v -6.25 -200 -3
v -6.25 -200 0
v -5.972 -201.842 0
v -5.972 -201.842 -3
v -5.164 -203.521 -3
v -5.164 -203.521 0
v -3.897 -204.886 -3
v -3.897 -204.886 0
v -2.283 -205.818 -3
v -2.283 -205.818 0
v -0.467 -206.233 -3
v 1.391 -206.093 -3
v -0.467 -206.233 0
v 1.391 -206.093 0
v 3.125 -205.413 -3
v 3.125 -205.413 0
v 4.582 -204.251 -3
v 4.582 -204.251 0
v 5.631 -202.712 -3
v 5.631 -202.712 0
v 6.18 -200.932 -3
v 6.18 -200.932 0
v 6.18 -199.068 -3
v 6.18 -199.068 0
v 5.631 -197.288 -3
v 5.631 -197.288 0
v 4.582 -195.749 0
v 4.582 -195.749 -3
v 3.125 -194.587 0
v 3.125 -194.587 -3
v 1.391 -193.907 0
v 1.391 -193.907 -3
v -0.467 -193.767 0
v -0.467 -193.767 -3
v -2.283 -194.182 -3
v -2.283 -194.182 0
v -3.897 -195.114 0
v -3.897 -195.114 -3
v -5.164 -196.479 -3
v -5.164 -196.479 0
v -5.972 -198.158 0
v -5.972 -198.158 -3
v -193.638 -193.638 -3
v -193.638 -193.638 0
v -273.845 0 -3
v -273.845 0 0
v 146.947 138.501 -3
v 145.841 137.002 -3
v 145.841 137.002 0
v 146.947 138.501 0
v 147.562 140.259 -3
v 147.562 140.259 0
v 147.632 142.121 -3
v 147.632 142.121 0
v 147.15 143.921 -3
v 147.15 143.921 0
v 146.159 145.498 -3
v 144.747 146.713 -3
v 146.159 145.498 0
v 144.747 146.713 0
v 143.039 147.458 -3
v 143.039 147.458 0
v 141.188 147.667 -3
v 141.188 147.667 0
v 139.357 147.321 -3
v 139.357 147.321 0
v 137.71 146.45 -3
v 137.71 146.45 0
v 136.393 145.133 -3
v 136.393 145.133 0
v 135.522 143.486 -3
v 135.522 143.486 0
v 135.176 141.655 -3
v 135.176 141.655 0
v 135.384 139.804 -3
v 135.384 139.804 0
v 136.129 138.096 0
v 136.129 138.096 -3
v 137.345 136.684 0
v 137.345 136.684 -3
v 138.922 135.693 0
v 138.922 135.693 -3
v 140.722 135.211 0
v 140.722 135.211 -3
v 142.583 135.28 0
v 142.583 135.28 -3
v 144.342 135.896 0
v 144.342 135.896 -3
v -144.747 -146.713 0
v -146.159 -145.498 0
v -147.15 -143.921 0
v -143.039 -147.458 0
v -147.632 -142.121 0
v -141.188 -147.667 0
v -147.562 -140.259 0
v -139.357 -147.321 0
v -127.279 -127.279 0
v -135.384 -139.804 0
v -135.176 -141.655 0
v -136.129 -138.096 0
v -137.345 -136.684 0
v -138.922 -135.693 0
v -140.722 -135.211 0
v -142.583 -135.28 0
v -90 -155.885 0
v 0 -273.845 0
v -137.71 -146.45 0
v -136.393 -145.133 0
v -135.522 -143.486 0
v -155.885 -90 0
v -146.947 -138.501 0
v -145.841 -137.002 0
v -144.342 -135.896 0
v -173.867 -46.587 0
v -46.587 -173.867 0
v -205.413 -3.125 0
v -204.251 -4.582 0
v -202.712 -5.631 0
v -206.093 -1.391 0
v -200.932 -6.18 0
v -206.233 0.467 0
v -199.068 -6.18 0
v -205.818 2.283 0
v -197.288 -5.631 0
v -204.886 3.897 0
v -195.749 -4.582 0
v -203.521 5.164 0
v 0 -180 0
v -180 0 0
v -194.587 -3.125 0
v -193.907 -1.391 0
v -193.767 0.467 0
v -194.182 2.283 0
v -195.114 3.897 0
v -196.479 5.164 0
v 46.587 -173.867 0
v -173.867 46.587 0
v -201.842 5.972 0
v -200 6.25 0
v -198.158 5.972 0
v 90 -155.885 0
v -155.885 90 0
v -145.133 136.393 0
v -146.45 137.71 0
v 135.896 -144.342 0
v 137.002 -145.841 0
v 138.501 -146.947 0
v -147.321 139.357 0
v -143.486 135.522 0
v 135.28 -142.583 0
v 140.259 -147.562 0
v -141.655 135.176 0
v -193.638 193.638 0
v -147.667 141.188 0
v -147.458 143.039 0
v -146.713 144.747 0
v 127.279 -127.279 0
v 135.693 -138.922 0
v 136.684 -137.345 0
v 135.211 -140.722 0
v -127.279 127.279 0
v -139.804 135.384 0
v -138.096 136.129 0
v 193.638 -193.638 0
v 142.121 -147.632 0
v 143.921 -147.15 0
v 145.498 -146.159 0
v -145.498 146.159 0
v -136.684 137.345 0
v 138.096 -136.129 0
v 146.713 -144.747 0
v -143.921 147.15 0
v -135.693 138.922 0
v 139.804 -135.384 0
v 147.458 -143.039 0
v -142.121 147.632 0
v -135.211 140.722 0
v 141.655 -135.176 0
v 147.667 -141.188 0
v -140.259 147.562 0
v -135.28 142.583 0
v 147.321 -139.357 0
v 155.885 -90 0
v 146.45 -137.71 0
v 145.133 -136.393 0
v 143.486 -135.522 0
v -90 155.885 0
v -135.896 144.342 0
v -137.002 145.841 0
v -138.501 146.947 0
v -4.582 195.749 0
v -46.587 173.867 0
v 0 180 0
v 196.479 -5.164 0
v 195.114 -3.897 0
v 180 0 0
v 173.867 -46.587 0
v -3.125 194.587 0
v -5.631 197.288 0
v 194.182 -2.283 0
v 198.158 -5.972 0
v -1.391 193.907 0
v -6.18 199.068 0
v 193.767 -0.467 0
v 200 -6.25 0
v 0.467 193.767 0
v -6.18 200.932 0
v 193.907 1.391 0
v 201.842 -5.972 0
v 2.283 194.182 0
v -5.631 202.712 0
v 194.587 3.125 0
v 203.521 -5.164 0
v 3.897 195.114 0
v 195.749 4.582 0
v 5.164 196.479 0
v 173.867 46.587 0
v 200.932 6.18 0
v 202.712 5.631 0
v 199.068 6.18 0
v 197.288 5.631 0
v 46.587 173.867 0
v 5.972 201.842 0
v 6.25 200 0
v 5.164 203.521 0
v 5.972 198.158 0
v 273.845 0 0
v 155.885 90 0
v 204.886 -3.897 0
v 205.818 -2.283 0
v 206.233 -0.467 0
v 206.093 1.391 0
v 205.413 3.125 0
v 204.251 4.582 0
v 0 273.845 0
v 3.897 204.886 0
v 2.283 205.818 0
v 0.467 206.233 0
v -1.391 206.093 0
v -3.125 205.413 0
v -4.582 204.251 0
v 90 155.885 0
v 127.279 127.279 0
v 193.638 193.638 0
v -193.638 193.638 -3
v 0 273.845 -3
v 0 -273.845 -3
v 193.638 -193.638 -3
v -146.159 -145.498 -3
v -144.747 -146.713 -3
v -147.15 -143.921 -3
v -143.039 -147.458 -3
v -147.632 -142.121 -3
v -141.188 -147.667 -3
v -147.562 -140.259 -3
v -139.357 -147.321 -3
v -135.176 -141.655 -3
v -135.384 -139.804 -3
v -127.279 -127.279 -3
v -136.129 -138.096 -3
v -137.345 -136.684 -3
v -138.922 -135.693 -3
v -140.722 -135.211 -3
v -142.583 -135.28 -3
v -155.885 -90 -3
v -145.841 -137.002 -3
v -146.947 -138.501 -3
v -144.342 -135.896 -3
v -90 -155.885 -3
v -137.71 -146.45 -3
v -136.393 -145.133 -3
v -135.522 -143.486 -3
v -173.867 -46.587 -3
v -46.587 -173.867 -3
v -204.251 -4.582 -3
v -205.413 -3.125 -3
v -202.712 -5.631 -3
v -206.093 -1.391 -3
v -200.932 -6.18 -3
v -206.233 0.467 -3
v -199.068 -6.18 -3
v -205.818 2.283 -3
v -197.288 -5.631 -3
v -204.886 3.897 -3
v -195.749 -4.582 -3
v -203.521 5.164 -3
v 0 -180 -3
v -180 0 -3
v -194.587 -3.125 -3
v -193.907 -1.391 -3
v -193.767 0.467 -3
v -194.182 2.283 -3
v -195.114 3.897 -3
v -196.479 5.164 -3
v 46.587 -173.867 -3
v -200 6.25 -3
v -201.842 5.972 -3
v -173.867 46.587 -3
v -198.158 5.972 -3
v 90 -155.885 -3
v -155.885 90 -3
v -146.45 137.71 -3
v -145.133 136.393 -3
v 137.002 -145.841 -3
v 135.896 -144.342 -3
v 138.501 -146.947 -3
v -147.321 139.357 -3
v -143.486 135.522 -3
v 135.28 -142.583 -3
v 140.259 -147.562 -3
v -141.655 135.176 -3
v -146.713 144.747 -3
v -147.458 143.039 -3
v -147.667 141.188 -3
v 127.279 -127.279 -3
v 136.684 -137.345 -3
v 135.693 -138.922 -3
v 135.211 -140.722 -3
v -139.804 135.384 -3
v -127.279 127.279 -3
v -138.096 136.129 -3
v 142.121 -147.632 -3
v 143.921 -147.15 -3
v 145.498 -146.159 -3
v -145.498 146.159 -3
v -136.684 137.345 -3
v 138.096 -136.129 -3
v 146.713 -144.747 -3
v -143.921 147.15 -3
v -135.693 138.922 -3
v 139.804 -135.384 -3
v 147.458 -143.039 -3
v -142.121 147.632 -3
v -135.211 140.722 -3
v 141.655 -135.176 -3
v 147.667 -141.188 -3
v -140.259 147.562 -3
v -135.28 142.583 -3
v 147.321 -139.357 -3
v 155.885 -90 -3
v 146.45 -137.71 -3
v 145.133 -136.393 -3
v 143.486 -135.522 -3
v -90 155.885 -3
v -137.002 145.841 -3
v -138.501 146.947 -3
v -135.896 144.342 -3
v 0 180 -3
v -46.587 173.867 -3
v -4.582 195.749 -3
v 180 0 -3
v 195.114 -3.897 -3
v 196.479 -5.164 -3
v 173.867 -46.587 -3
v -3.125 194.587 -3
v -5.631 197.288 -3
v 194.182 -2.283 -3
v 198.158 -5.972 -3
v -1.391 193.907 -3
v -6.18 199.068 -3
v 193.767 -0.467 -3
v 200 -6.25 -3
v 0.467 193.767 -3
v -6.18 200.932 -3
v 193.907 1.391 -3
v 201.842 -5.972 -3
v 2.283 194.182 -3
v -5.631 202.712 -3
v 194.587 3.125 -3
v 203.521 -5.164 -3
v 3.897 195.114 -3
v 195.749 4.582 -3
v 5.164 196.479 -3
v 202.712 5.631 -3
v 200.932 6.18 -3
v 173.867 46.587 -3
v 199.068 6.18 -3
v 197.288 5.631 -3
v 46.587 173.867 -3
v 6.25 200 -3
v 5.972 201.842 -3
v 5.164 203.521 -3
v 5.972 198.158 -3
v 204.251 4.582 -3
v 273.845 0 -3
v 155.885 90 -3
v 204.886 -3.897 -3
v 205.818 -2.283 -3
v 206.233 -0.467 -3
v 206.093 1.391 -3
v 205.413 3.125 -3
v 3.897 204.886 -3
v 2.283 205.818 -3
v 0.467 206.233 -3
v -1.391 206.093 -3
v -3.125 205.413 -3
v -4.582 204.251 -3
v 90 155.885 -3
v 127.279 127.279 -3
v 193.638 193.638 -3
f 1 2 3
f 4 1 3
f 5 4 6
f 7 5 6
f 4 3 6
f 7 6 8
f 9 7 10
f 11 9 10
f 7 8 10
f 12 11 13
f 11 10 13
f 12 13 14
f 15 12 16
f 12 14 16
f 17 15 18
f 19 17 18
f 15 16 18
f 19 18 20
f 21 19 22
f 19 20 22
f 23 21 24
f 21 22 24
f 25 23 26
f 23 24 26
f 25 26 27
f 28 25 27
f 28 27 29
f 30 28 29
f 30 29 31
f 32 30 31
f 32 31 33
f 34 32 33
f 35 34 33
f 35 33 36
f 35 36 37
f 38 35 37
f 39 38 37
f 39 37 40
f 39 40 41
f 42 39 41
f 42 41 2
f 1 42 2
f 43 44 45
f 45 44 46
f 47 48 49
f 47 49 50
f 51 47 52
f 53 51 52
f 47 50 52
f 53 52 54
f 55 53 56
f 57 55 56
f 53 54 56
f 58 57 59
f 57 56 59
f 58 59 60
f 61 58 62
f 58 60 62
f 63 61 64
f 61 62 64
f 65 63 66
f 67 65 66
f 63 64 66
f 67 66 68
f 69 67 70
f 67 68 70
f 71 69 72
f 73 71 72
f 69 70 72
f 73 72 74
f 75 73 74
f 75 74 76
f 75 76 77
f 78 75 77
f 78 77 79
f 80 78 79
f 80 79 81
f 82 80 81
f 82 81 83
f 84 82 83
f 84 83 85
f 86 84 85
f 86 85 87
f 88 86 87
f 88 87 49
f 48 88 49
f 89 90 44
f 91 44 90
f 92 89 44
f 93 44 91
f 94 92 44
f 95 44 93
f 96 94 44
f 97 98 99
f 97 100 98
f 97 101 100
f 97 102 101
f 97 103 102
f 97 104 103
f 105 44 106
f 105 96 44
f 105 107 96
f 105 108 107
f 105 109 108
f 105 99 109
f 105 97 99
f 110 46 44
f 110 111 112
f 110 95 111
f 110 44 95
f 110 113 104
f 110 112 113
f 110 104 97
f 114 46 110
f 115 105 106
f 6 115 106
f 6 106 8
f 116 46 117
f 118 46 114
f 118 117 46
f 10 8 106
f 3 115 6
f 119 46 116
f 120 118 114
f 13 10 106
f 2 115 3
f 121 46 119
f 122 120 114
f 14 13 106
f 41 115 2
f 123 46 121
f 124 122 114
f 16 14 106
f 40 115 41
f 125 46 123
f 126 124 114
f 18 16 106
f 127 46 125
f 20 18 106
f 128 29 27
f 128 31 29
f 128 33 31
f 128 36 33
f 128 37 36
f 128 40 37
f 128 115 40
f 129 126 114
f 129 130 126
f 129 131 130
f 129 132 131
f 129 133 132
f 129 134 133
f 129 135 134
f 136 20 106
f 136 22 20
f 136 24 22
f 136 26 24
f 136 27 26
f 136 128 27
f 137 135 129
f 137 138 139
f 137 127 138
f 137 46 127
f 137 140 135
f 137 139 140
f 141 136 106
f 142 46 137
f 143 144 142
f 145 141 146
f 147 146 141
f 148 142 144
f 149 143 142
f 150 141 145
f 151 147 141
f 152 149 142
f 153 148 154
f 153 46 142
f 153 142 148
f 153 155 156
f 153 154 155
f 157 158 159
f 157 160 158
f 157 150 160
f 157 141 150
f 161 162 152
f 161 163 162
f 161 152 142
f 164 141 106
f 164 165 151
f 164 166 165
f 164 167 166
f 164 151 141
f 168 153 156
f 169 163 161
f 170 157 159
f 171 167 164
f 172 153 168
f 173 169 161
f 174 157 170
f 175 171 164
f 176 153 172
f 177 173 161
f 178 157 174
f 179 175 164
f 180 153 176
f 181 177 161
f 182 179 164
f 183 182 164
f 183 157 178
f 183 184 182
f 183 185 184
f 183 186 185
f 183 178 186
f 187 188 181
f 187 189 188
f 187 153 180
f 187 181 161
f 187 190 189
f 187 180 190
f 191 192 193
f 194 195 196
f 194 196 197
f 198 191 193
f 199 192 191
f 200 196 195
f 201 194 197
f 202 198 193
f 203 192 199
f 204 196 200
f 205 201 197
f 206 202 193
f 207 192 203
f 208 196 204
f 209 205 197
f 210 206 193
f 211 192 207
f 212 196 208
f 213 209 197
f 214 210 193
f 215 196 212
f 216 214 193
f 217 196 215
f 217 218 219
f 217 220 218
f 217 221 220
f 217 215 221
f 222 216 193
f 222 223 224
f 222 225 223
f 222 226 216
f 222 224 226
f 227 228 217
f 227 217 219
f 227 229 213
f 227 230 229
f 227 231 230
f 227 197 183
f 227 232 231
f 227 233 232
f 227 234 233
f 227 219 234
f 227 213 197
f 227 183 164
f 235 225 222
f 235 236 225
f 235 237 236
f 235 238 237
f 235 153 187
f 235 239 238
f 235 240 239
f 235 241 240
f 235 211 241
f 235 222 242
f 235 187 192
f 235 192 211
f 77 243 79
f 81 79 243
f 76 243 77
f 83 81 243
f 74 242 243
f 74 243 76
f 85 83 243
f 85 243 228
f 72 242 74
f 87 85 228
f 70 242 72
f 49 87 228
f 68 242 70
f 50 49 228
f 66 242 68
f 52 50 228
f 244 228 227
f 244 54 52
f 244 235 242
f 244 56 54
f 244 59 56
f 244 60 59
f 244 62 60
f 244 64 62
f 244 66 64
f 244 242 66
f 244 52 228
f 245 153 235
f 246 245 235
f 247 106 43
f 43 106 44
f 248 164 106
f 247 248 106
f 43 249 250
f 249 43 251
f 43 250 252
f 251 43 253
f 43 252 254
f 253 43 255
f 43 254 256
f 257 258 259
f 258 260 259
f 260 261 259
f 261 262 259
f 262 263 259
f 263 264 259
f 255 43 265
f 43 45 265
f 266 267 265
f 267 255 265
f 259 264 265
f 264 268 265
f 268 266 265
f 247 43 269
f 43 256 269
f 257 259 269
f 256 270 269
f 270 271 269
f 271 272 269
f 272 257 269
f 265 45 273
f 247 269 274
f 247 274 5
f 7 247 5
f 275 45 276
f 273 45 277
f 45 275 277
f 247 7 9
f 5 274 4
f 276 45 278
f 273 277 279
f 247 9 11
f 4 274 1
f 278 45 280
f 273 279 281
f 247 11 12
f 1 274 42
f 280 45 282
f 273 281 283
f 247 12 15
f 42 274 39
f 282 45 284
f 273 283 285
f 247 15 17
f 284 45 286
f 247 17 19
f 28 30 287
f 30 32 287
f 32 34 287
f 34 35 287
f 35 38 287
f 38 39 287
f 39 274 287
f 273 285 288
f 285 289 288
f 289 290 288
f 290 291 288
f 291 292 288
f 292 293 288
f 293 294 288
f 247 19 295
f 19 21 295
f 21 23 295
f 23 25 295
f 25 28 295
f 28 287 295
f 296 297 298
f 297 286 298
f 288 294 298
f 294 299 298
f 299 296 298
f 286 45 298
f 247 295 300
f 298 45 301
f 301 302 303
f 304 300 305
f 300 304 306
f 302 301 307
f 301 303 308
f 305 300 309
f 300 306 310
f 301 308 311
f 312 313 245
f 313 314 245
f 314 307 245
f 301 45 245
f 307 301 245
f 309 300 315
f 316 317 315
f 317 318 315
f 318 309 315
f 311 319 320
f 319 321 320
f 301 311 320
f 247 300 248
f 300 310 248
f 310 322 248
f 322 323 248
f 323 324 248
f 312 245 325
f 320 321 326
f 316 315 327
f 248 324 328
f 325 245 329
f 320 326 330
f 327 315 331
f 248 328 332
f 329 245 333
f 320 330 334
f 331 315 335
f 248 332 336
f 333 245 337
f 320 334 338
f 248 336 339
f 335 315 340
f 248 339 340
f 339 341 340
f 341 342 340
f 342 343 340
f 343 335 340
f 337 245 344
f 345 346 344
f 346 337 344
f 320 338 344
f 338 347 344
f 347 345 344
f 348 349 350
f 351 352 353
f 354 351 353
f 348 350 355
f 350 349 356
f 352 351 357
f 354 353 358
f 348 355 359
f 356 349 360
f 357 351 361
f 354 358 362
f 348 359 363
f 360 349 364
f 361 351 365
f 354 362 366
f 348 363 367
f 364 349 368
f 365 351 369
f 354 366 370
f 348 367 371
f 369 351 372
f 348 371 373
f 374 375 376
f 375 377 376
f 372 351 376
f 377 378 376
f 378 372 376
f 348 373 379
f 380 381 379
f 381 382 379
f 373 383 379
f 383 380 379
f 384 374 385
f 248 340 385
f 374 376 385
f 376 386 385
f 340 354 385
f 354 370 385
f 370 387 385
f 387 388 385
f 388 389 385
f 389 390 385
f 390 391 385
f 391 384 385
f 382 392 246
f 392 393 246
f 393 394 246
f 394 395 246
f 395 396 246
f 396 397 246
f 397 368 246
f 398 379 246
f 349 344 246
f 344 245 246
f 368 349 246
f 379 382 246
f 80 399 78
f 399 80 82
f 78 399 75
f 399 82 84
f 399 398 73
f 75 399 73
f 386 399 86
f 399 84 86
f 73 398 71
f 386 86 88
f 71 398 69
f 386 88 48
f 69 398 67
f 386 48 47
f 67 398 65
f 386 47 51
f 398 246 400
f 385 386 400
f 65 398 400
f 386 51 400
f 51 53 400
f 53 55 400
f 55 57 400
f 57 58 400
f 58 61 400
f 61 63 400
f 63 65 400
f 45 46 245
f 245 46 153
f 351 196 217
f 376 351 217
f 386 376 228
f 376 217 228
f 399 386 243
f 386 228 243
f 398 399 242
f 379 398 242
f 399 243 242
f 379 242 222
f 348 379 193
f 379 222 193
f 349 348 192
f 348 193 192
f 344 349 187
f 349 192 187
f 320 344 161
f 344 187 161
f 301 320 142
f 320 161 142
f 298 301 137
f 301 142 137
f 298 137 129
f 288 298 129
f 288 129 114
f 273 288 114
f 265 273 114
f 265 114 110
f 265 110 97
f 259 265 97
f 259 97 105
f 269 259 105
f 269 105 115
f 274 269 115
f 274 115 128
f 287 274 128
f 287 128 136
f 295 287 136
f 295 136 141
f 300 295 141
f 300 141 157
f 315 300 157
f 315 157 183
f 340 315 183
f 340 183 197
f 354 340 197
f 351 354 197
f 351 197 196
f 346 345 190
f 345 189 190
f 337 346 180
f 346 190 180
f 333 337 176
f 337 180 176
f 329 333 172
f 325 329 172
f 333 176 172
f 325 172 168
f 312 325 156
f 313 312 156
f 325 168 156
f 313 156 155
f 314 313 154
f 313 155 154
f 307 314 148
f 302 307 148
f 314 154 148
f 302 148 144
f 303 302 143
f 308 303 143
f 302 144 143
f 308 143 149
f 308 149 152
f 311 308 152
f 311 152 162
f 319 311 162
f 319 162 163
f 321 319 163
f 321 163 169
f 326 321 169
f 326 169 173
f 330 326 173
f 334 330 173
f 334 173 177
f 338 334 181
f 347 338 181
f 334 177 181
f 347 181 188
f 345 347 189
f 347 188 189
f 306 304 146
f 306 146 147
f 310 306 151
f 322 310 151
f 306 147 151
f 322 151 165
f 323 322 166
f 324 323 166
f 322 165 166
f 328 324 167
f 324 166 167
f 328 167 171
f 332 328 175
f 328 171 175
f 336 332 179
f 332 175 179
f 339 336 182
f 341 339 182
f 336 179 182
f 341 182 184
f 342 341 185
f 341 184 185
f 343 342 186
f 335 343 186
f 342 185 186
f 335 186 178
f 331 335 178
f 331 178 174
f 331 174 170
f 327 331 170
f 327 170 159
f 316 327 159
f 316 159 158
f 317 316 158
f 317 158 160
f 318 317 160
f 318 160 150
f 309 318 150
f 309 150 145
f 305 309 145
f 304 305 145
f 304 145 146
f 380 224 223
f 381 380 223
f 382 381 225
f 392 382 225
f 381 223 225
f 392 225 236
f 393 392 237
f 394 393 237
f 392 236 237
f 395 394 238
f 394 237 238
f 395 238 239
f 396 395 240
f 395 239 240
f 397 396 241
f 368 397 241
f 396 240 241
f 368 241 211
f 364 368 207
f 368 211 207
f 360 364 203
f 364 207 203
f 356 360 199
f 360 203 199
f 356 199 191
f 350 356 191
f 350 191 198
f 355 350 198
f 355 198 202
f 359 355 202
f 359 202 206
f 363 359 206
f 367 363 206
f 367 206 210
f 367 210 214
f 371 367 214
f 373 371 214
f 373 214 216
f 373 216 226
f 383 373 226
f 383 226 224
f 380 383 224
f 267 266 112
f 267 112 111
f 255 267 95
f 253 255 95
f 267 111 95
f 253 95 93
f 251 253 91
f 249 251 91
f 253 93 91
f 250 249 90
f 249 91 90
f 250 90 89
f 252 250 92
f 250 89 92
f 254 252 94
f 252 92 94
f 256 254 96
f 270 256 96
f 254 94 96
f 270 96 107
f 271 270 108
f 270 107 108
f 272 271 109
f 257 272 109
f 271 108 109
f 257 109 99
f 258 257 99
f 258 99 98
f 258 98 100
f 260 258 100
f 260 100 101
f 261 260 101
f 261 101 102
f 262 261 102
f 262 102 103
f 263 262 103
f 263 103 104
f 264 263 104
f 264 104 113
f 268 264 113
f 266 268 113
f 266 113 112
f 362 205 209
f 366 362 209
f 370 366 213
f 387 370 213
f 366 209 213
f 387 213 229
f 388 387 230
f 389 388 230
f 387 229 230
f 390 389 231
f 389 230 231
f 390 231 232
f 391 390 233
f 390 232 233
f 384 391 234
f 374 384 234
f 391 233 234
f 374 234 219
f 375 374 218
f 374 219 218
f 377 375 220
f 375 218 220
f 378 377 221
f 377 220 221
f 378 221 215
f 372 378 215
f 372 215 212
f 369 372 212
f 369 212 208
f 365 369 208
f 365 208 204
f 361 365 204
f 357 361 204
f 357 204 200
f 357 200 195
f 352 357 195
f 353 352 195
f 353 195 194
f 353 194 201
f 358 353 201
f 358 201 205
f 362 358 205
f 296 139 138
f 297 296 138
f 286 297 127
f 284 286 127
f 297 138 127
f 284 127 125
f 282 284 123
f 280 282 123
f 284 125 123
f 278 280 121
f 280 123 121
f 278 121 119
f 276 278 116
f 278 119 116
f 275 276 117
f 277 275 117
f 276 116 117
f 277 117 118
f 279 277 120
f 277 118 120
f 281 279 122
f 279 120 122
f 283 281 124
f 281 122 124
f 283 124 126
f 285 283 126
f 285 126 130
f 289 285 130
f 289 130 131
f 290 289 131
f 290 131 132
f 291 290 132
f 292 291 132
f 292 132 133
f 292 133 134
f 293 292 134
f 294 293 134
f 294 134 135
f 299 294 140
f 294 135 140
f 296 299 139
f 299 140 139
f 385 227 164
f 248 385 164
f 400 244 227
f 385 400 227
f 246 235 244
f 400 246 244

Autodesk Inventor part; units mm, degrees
ref_plane "YZ Plane" through (0, 0, 0) normal (1, 0, 0) x (0, 1, 0)
ref_plane "XZ Plane" through (0, 0, 0) normal (0, 1, 0) x (-1, 0, 0)
ref_plane "XY Plane" through (0, 0, 0) normal (0, 0, 1) x (1, 0, 0)
sketch "Sketch2" plane through (0, 0, 0) normal (0, 0, 1) x (1, 0, 0)
  line L0 (-193.6378, 193.6378) -> (0, 273.8452)
  line L1 (0, 273.8452) -> (193.6378, 193.6378)
  line L2 (193.6378, 193.6378) -> (273.8452, 0)
  line L3 (273.8452, 0) -> (193.6378, -193.6378)
  line L4 (193.6378, -193.6378) -> (0, -273.8452)
  line L5 (0, -273.8452) -> (-193.6378, -193.6378)
  line L6 (-193.6378, -193.6378) -> (-273.8452, 0)
  line L7 (-273.8452, 0) -> (-193.6378, 193.6378)
  circle A0 centre (0, 0) radius 180
  dimension "d23" = 506
  dimension "d26" = 360
extrude "Plate1" add sketch "Sketch2" against normal blind 3
sketch "Sketch4" plane through (0, 0, 0) normal (0, 0, 1) x (1, 0, 0)
  circle A0 centre (0, 200) radius 6.25
  circle A1 centre (0, 0) radius 180 projected
  dimension "d16" = 12.5
  dimension "d17" = 200
extrude "Extrusion1" cut sketch "Sketch4" against normal up to surface (3 mm away) contours A0
pattern_circular "Circular Pattern1" count 8 over 360 about axis through (0, 0, -10) along (0, 0, 1) of "Extrusion1"
equation "\"d23\" = Барабан_габарит_по_кассетам"
equation "\"d26\" = Вал_ось_диаметр_КОРМА"
equation "\"d15\" = Thickness"
equation "\"BendRadius\" = Thickness"
equation "\"BendReliefWidth\" = Thickness"
equation "\"BendReliefDepth\" = 0.5 * Thickness"
equation "\"CornerReliefSize\" = 4 * Thickness"
equation "\"MinimumRemnant\" = 2 * Thickness"
equation "\"TransitionRadius\" = BendRadius"
equation "\"JacobiRadiusSize\" = BendRadius"
equation "\"GapSize\" = Thickness"
equation "\"Барабан_габарит_по_кассетам\" = 506"
equation "\"Вал_ось_диаметр_КОРМА\" = 360"
equation "\"Thickness\" = 3"
properties part number "ДМС 101 Барабан торец зад"
